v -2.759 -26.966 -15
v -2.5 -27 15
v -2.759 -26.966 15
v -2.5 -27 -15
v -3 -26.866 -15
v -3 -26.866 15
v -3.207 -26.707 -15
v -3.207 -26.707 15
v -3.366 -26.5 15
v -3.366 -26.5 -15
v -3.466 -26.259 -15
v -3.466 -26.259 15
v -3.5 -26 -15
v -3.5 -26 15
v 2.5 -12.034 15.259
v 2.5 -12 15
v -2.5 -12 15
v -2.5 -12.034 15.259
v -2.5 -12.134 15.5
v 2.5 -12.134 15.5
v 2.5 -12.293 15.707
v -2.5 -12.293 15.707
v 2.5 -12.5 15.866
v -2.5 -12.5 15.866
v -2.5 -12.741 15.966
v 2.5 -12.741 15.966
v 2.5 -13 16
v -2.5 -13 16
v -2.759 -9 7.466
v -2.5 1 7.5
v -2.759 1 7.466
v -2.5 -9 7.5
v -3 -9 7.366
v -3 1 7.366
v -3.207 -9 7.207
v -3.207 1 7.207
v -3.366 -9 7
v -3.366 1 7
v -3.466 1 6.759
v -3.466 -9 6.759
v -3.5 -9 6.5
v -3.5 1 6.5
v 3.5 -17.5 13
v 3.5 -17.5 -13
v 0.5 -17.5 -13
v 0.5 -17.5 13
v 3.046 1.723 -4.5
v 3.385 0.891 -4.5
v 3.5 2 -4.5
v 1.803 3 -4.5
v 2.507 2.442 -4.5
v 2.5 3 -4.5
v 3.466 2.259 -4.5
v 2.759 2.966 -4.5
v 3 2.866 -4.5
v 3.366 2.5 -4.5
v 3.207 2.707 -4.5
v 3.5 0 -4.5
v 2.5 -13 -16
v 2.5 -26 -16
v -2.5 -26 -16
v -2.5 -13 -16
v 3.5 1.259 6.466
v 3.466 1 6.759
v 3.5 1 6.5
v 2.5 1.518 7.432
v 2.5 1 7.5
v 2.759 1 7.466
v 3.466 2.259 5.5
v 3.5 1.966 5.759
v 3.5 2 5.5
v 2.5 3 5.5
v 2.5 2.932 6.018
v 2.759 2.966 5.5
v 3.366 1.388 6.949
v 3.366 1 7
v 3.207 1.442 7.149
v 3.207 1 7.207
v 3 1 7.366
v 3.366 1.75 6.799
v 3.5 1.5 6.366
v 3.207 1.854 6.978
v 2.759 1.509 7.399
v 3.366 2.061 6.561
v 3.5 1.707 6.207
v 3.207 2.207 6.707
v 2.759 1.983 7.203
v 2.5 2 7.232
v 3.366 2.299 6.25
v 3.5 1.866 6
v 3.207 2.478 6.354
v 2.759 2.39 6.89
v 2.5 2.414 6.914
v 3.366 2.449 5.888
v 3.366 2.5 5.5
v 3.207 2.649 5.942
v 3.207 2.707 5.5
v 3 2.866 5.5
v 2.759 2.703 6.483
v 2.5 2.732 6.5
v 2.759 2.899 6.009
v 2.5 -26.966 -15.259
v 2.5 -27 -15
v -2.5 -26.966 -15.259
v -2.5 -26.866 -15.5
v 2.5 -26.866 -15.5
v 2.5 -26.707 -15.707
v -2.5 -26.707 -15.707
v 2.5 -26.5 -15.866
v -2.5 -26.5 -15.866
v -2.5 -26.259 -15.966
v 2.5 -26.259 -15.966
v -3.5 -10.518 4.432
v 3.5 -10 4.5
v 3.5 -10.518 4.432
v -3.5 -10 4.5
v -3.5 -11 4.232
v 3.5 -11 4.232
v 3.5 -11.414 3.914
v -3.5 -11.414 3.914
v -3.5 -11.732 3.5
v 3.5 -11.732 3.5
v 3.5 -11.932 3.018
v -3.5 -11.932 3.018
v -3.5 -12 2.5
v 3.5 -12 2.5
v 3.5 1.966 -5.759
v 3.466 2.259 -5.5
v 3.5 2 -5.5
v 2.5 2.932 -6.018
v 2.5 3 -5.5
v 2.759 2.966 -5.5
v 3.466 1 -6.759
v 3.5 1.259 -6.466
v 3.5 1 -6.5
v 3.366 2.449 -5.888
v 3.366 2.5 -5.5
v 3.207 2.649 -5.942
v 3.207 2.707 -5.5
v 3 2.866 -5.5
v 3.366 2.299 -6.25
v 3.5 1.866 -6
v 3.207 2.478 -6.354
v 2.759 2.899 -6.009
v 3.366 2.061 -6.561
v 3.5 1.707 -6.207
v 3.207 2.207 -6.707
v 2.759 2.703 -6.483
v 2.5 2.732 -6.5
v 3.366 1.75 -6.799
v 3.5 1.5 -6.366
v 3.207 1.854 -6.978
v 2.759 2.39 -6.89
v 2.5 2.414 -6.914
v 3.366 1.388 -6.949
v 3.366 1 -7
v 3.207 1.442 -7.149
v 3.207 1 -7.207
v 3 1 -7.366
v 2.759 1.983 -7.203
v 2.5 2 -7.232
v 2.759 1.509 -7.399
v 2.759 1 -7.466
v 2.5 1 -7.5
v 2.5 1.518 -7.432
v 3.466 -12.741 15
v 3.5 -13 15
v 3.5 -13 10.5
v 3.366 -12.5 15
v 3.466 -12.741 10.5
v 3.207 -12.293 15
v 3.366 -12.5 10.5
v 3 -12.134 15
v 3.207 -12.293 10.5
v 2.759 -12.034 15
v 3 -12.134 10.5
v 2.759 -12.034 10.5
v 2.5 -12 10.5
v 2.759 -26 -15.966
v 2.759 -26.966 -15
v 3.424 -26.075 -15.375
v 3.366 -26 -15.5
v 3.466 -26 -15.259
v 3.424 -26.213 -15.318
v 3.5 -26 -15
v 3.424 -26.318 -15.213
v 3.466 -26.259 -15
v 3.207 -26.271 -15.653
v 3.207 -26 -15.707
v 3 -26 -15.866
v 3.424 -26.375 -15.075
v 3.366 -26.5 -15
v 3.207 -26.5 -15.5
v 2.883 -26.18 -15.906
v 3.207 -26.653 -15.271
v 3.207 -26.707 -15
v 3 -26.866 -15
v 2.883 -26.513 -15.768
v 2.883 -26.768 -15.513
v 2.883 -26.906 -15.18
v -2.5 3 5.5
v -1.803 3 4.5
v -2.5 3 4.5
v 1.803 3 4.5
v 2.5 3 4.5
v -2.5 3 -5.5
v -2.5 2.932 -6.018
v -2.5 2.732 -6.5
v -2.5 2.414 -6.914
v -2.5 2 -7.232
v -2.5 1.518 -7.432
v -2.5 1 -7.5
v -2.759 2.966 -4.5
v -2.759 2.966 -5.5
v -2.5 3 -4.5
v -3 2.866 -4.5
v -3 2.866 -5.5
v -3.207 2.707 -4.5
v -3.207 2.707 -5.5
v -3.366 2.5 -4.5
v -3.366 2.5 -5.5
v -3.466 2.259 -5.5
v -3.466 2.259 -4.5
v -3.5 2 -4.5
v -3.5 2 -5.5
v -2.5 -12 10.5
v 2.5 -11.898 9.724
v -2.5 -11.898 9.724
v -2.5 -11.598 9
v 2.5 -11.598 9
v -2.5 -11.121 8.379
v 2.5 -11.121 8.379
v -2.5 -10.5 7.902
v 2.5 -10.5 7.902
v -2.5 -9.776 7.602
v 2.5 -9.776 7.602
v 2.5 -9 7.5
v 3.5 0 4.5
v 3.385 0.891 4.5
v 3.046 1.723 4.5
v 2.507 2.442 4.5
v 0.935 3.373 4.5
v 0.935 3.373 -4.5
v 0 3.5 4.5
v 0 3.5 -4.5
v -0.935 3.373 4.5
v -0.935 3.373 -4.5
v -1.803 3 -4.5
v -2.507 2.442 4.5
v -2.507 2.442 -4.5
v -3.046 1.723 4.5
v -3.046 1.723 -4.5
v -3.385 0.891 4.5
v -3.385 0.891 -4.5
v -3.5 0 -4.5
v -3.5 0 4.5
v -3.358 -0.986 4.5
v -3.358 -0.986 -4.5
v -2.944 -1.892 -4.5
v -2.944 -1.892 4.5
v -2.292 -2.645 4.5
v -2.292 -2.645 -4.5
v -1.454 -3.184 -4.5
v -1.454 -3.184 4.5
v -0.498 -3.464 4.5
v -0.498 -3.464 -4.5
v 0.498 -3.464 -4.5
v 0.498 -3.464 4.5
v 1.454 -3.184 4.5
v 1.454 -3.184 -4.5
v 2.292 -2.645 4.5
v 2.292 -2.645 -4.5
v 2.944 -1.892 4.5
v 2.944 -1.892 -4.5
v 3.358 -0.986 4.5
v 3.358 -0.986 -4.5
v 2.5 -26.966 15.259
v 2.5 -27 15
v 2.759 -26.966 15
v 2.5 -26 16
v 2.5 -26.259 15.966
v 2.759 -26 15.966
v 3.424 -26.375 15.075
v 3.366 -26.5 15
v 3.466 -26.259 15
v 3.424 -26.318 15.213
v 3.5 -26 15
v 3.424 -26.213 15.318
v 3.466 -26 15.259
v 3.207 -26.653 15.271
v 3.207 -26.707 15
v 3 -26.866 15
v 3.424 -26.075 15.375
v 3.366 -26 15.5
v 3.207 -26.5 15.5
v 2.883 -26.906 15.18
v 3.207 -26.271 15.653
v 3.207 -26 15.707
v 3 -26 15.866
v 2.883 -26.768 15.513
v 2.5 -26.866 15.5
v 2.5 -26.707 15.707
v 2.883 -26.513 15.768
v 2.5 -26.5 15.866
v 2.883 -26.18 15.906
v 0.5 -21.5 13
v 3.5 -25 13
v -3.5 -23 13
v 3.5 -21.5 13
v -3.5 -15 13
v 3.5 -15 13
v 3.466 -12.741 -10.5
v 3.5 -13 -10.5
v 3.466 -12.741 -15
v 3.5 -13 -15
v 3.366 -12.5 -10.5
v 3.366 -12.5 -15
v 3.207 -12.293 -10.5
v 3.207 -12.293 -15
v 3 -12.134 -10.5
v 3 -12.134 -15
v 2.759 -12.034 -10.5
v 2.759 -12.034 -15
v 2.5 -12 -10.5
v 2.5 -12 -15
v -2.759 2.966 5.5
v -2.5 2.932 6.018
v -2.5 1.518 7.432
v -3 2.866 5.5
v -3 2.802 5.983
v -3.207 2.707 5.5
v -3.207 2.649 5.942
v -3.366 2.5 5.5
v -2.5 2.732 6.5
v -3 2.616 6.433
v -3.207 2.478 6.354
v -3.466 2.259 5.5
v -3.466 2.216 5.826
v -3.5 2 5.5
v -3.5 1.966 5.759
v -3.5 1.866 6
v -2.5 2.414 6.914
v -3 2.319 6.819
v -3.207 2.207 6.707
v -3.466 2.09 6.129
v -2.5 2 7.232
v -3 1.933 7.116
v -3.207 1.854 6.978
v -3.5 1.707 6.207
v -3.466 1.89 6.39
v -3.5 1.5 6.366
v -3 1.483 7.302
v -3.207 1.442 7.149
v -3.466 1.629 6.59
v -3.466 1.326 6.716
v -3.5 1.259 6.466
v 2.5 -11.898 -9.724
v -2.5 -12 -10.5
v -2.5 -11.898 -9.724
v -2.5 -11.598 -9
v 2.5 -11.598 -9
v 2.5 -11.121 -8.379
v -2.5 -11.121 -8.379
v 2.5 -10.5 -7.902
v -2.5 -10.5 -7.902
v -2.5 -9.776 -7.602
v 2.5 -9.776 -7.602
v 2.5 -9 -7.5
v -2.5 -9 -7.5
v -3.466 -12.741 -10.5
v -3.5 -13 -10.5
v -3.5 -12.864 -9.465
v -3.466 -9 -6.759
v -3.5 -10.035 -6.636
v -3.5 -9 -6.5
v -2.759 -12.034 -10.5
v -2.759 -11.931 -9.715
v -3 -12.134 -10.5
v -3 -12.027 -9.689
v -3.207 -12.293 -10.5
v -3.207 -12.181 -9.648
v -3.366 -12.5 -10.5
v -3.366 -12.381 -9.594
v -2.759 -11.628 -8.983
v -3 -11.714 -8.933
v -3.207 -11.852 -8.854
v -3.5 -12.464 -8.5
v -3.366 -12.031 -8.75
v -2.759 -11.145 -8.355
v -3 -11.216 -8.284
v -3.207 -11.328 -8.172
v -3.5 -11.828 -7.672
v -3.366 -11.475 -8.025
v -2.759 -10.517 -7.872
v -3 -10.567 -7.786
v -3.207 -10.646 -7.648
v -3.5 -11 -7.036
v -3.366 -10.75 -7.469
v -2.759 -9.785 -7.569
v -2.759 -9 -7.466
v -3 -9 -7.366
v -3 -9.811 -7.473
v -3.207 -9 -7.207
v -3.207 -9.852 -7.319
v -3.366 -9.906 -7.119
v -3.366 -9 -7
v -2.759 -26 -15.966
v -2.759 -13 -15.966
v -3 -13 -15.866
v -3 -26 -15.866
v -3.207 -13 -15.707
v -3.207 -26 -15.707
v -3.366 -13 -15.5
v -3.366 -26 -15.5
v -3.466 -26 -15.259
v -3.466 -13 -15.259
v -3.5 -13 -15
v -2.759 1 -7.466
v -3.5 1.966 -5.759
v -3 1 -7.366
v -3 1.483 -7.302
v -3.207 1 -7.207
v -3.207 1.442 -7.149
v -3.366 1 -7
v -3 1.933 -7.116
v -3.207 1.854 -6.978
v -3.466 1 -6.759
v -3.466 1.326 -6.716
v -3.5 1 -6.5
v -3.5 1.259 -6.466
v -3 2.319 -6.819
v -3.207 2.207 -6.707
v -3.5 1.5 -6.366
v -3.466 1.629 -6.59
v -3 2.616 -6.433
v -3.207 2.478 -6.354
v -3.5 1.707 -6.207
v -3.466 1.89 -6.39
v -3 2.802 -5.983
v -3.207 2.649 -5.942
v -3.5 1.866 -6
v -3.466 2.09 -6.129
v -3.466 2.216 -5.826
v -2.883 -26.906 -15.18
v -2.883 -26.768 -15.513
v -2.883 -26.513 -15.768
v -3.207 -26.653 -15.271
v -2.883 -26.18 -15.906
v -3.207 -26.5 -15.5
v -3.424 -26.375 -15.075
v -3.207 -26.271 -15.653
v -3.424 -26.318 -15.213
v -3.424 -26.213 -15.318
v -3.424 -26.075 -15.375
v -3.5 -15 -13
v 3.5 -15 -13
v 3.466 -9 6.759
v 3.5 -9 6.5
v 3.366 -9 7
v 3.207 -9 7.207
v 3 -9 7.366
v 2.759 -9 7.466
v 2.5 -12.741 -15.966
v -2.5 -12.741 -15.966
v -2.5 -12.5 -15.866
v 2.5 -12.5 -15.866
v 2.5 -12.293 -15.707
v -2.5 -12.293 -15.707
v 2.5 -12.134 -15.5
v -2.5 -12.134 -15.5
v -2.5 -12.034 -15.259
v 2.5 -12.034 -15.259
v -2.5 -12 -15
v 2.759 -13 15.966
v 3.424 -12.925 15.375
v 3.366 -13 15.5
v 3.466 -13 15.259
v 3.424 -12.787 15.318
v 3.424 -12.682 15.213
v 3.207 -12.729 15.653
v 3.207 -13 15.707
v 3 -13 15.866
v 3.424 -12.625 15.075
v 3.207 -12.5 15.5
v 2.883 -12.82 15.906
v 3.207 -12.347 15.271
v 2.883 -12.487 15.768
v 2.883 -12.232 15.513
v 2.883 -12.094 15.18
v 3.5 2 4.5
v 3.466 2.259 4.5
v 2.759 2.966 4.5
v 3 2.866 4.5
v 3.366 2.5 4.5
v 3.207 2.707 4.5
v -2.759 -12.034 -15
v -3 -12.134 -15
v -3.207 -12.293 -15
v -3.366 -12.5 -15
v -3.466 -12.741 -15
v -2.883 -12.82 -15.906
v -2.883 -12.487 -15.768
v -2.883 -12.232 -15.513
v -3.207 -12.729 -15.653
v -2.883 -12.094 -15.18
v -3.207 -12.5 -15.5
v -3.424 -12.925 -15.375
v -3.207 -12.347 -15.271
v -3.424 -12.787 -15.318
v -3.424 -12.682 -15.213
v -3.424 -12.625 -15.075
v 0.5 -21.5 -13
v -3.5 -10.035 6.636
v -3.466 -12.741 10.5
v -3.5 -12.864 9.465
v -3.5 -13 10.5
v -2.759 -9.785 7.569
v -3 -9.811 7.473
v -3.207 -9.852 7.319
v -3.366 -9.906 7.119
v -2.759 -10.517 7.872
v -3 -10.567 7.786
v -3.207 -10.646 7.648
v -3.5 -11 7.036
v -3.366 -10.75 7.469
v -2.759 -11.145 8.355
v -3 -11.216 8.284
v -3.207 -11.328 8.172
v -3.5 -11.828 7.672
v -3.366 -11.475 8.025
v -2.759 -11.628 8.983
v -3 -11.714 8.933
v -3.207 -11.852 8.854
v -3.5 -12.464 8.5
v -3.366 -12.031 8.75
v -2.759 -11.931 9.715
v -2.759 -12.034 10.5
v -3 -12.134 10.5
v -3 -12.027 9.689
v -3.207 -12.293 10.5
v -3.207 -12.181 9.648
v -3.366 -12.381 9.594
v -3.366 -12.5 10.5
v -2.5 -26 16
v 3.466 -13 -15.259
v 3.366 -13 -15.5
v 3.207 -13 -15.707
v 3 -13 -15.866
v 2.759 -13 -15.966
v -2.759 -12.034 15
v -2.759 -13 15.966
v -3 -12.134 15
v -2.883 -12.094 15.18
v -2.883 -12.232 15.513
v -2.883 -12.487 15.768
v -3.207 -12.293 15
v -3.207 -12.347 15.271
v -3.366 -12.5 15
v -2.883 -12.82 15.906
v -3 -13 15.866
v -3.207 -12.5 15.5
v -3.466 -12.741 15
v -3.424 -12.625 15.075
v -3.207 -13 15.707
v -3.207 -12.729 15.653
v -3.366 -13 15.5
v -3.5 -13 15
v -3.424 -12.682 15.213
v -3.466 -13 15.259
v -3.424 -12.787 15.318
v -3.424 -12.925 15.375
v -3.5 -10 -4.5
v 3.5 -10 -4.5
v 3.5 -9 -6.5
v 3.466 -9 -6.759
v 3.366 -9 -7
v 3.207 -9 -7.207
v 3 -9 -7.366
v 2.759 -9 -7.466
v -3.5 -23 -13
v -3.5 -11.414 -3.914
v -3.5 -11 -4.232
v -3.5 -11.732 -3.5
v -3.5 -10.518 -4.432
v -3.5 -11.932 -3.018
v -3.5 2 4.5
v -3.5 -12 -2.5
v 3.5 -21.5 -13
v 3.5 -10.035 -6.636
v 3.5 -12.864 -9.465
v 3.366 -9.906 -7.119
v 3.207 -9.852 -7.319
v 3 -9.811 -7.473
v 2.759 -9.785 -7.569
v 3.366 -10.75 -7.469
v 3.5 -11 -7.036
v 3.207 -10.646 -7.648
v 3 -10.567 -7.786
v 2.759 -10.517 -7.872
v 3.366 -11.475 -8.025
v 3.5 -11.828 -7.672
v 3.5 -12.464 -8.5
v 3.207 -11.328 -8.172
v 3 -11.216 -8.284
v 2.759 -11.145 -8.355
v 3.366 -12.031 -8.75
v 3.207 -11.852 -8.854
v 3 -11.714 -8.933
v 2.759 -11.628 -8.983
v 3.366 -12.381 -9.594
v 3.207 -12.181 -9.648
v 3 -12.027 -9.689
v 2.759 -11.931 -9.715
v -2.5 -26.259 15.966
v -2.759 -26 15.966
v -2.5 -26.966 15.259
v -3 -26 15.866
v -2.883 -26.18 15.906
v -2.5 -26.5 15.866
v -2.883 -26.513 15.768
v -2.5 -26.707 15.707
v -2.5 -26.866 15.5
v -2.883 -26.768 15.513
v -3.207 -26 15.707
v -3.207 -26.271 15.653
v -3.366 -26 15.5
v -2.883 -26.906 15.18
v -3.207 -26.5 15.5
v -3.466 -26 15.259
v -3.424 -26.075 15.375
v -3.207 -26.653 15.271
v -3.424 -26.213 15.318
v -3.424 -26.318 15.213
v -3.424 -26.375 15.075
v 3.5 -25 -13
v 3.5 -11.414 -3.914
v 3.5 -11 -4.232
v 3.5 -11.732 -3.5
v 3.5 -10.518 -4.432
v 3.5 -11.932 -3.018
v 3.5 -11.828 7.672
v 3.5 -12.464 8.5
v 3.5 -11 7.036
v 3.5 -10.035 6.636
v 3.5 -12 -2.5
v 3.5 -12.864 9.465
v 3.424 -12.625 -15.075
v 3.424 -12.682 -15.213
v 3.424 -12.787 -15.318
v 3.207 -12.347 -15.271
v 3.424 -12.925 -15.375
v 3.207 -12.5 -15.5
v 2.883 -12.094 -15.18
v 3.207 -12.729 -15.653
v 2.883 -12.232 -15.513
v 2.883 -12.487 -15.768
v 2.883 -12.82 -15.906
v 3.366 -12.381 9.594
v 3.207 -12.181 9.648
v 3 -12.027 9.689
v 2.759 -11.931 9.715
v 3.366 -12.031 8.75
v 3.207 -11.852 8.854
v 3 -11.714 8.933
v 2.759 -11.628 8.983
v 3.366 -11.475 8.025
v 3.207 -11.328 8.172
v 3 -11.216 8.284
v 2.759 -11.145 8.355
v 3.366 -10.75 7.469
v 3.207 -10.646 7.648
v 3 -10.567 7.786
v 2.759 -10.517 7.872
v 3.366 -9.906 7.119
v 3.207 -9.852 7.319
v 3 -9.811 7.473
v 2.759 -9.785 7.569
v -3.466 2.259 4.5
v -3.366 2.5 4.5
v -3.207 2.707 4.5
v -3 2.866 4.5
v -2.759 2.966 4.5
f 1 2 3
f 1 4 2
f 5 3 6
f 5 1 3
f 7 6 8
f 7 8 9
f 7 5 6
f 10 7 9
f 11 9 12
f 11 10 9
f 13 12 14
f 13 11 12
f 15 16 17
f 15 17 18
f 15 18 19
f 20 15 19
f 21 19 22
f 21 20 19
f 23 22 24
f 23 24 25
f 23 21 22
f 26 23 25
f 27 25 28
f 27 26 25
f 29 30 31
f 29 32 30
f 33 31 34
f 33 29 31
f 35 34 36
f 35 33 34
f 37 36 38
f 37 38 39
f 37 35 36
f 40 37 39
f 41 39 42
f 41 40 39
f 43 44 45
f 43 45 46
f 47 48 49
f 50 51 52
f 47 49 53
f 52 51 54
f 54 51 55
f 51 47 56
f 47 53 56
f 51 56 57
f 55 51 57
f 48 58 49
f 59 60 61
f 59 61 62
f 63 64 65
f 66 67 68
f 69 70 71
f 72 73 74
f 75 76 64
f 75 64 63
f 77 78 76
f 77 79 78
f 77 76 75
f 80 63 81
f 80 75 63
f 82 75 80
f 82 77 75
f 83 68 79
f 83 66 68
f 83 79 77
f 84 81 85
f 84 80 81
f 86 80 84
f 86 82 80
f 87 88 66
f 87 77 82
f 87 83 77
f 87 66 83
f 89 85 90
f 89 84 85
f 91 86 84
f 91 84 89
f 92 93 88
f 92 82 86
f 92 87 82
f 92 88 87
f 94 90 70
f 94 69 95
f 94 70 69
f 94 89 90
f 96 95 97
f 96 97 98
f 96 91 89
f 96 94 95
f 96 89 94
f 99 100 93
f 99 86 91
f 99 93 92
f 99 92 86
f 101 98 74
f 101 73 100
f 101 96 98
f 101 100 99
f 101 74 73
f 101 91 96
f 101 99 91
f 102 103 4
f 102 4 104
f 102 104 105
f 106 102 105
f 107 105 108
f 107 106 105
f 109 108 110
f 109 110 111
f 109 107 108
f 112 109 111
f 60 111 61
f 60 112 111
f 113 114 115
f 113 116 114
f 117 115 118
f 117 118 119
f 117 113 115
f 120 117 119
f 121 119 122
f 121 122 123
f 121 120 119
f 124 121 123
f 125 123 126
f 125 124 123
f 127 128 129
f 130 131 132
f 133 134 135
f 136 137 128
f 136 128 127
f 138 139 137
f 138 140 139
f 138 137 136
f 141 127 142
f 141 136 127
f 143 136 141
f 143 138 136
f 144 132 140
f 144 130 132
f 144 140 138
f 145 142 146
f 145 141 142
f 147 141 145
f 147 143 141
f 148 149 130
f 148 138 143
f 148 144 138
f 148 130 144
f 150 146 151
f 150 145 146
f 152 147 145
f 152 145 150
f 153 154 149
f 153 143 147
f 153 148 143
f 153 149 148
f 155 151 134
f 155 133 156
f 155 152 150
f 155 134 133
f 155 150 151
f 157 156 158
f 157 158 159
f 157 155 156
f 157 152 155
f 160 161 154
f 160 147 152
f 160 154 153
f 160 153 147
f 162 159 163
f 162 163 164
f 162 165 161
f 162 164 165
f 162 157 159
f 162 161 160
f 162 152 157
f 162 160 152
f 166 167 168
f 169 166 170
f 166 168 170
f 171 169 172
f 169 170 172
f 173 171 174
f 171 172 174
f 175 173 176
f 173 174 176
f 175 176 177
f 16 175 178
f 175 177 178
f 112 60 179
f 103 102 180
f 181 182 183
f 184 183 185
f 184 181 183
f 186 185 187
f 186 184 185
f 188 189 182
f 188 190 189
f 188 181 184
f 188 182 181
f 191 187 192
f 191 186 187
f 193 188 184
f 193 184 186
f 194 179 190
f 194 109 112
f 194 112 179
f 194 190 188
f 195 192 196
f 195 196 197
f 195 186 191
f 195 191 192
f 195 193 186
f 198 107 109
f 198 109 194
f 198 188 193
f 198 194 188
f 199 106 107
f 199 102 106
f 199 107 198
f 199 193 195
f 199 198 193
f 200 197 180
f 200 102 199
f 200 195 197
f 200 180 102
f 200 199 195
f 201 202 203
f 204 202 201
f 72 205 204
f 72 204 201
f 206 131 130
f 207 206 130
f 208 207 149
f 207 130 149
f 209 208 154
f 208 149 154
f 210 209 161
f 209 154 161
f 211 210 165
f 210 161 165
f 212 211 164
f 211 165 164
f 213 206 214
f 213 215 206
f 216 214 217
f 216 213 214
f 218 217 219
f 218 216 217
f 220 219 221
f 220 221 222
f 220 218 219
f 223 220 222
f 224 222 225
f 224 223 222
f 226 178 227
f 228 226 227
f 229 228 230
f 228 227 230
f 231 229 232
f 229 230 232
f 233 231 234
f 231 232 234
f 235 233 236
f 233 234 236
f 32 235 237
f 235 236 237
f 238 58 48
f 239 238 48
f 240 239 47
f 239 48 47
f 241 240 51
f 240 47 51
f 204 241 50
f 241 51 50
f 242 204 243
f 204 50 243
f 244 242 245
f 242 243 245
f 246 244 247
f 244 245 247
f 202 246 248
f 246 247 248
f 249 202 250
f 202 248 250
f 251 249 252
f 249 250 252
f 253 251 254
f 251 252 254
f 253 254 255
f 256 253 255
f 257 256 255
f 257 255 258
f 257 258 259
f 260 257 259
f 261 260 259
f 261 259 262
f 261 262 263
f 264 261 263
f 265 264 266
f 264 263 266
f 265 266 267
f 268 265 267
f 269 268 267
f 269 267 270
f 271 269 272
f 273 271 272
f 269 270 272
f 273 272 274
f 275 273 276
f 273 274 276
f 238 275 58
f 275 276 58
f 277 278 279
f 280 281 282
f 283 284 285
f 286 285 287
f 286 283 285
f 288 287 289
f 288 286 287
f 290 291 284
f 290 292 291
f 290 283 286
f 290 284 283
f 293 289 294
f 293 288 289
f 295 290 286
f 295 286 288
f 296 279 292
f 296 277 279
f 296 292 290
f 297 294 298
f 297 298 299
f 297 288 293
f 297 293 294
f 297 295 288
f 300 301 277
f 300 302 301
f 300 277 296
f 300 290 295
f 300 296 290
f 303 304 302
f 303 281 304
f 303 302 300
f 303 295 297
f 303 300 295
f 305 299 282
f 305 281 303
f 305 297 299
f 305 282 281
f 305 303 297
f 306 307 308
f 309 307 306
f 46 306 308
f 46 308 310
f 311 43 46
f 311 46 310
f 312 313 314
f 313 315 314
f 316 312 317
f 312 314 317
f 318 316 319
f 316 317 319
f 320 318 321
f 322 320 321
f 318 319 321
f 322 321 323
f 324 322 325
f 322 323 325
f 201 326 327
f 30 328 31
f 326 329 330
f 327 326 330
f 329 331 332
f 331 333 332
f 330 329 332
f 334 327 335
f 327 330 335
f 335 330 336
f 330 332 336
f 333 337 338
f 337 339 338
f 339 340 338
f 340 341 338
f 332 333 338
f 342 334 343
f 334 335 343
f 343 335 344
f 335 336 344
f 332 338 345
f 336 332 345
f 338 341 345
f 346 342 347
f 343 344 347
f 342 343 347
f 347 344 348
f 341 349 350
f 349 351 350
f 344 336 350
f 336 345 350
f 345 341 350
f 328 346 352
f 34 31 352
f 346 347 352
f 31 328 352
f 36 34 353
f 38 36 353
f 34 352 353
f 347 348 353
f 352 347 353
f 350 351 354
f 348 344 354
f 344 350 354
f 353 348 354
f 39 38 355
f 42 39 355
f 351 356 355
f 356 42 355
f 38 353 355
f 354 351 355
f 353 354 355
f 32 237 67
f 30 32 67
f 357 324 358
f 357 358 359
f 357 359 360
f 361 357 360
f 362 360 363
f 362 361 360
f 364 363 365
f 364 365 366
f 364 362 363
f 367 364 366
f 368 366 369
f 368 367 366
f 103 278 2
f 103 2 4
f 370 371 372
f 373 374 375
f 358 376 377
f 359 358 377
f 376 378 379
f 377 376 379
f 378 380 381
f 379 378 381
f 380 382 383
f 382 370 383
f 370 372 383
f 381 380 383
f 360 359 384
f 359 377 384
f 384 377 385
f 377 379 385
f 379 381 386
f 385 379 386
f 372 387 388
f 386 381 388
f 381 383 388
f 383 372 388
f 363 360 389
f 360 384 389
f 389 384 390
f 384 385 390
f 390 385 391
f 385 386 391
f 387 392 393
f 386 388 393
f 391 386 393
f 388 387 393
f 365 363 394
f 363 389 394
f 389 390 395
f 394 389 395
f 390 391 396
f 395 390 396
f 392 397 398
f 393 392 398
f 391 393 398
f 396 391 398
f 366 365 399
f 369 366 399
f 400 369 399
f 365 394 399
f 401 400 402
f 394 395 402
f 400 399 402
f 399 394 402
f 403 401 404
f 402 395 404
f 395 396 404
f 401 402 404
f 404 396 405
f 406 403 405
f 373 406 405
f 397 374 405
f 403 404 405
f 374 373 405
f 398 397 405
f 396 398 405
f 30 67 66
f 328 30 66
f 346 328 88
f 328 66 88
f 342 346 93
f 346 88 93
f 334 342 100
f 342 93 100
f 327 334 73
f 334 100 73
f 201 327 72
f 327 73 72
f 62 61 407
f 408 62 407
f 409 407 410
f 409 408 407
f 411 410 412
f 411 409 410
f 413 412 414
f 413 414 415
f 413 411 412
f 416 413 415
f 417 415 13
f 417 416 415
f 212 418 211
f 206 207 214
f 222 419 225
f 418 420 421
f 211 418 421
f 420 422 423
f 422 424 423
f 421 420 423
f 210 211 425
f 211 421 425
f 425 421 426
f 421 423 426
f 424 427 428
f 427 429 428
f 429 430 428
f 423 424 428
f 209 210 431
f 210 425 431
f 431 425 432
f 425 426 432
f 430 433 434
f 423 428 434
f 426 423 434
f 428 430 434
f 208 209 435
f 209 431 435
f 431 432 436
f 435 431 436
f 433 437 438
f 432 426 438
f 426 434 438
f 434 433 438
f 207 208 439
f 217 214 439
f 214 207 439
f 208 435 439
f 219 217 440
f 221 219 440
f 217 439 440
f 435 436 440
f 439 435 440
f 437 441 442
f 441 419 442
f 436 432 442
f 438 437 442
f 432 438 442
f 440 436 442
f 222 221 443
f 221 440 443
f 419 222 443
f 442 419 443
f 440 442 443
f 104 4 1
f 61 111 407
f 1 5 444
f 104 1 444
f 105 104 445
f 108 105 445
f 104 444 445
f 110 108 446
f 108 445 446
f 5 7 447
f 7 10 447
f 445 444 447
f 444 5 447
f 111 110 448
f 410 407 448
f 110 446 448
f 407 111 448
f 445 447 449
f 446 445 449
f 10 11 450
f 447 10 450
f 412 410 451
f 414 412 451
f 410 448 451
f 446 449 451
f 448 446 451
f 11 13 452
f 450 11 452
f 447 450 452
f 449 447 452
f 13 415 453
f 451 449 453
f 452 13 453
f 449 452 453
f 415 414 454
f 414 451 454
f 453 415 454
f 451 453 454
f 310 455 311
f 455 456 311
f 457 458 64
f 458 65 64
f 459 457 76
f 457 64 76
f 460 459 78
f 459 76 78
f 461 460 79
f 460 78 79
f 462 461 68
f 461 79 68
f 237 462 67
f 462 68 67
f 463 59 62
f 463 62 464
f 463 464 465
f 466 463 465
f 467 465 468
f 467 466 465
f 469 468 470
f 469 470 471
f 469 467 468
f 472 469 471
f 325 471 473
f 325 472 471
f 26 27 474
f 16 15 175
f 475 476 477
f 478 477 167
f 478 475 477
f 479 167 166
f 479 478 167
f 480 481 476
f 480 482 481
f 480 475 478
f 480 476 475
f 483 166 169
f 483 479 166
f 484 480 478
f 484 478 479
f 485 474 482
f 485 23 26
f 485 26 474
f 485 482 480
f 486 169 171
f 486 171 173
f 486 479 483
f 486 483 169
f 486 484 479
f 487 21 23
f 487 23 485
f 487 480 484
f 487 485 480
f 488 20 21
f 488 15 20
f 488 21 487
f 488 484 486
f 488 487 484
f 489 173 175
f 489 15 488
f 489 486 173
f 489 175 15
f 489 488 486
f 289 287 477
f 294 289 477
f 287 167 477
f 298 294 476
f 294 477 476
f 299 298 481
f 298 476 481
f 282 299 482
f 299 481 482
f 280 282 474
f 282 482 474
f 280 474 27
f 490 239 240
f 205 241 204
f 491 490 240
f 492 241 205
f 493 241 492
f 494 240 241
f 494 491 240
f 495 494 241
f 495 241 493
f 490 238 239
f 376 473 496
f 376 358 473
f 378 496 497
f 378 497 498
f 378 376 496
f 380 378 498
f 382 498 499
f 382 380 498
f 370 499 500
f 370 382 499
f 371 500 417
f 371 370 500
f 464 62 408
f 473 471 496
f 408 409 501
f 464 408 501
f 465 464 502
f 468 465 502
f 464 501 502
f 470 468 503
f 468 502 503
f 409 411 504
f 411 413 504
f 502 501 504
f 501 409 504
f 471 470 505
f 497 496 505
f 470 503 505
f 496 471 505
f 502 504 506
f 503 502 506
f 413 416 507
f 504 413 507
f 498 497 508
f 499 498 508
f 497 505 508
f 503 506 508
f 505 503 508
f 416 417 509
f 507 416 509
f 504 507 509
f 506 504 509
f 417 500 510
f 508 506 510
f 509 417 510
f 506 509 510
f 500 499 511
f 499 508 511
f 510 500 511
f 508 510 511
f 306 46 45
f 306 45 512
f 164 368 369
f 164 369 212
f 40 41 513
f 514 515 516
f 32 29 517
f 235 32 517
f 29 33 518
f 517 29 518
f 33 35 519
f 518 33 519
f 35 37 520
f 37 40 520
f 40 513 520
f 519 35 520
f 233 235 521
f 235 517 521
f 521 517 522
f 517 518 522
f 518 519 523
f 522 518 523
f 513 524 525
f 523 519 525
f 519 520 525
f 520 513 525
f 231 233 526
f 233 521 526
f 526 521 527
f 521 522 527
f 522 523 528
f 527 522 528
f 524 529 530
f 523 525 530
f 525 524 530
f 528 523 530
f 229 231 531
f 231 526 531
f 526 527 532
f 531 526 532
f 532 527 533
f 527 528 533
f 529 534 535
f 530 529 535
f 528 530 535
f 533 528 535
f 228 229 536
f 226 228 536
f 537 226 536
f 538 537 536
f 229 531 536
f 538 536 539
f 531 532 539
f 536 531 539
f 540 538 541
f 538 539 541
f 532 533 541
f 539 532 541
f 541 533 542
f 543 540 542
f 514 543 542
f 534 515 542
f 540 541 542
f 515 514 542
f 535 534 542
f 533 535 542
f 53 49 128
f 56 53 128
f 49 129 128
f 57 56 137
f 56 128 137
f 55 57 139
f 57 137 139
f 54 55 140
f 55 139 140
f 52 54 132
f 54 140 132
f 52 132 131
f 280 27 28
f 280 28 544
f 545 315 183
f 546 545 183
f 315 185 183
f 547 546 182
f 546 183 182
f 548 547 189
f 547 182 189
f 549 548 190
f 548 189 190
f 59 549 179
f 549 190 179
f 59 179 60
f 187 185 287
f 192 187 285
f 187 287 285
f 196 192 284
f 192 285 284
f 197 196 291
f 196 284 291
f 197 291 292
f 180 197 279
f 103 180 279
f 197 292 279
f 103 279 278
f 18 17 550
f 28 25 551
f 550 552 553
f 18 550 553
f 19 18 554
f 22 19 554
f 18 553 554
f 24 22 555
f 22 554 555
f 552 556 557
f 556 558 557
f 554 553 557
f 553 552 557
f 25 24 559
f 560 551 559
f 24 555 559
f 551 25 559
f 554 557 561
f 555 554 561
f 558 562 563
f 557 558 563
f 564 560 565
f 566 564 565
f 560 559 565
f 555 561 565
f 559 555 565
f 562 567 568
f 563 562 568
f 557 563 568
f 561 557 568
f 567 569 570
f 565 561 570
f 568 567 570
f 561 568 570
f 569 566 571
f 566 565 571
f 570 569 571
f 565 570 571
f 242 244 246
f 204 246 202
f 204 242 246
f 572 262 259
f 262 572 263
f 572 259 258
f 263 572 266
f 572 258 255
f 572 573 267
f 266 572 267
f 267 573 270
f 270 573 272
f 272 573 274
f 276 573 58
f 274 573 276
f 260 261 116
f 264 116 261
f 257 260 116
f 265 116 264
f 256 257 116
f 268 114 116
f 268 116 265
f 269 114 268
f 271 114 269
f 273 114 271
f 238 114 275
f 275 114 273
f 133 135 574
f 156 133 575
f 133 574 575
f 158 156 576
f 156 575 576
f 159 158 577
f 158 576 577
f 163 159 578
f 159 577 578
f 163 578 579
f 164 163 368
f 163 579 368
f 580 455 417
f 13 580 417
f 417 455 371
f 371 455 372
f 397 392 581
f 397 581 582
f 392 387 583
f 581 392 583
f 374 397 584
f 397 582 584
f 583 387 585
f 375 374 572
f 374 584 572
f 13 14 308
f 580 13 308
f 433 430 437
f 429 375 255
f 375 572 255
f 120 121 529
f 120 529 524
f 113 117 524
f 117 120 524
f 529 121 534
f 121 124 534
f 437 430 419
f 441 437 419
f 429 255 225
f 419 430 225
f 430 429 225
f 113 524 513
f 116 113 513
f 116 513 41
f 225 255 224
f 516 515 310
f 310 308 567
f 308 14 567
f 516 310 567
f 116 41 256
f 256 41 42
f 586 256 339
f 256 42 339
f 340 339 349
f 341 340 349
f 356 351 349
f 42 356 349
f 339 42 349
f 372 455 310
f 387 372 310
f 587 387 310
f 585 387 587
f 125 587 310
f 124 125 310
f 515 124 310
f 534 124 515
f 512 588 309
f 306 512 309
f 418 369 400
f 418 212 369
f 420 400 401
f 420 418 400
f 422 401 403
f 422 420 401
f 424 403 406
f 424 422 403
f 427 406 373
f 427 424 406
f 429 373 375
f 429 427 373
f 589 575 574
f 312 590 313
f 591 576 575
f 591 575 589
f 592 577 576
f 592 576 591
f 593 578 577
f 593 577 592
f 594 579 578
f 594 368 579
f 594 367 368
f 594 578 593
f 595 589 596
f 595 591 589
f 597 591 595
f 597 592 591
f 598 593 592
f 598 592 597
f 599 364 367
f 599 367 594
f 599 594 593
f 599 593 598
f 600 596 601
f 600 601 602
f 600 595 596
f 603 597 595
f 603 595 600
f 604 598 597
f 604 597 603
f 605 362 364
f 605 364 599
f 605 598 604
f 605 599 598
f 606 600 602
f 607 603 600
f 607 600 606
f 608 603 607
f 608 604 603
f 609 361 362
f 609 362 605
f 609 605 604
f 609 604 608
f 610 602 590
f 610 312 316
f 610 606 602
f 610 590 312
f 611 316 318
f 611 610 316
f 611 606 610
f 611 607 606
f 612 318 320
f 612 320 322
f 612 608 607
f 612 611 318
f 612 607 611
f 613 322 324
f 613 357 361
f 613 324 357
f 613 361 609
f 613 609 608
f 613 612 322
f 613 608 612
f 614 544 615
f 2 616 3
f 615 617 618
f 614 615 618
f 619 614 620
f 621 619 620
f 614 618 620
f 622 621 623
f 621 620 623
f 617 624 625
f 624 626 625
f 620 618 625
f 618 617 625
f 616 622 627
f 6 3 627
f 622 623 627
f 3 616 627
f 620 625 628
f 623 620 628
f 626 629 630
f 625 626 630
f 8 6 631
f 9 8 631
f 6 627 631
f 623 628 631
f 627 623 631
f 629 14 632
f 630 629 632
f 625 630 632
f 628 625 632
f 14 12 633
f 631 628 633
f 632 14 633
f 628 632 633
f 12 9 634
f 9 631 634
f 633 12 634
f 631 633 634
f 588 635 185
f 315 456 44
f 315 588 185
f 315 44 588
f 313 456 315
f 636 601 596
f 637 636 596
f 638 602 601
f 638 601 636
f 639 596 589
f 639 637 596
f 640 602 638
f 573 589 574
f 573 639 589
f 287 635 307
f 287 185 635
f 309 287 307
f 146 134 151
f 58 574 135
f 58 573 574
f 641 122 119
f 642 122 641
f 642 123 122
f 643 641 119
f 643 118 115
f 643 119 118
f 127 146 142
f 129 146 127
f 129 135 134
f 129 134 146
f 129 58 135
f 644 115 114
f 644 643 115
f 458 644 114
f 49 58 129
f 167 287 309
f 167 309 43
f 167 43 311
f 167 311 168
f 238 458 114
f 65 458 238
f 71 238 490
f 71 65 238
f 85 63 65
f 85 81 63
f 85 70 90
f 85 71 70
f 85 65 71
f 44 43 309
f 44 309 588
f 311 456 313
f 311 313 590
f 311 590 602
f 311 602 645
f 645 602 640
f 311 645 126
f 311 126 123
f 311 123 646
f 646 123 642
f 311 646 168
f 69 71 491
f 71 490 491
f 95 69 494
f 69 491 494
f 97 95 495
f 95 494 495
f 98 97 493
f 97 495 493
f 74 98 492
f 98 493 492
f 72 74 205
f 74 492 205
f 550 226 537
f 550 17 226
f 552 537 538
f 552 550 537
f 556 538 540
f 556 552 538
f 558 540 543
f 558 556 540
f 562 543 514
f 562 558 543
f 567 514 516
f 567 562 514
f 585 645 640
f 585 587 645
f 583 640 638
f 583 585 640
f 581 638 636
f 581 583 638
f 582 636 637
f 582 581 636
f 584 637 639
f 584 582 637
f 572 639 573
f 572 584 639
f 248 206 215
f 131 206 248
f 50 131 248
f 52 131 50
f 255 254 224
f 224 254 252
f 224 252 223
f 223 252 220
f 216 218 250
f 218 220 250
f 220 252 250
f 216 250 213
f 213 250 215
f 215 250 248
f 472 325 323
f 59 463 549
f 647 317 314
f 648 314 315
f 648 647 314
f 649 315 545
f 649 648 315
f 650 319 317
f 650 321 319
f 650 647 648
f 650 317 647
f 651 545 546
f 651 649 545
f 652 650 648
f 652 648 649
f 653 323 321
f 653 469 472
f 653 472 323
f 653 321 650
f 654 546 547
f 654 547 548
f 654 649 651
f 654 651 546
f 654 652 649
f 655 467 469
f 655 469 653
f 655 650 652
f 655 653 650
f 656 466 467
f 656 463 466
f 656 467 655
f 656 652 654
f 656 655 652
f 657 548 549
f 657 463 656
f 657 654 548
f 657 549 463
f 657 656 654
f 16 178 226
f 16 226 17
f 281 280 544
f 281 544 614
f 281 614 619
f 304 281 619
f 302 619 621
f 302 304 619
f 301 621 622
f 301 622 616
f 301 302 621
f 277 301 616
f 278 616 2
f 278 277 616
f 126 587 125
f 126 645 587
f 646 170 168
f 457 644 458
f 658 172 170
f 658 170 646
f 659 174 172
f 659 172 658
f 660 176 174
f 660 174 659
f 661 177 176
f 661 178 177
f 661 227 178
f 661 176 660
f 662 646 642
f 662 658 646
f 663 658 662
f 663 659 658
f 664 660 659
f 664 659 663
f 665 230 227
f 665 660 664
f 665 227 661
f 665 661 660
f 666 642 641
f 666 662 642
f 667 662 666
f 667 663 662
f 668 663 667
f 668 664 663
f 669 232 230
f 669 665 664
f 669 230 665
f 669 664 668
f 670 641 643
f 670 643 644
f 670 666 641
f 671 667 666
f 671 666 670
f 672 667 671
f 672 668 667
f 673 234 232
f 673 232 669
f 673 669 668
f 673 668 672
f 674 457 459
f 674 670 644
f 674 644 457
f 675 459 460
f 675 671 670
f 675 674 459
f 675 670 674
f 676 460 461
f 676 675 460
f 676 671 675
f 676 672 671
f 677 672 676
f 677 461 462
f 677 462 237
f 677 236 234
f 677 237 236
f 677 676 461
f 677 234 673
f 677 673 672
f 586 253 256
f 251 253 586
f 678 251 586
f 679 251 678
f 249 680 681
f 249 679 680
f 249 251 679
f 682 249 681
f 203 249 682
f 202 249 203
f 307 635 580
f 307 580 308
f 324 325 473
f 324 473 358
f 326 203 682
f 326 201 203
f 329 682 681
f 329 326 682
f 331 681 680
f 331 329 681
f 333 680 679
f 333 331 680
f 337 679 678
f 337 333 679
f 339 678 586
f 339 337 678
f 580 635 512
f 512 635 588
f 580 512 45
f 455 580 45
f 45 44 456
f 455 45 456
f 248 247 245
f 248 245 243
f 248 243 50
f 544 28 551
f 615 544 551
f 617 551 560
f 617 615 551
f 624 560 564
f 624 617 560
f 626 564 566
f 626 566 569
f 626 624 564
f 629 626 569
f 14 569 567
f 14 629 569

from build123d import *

# Parameters (mm, degrees)
F0_W      = 15
F0_H      = 3
F0_W_2    = 1.5
F0_H_2    = 26
F0_W_3    = 2.5
F1_DEPTH  = 3.5
F2_R      = 3.5
F3_DEPTH  = 9
F4_R      = 1
F5_R      = 3
F6_R      = 2
F7_R      = 1
F8_SIZE2  = 1.99999
F8_SIZE   = 6.99999
F9_W      = 4
F9_H      = 26
F10_DEPTH = 4


# Not quite as in the source:
# - a fillet or chamfer is up to 0.001 mm smaller than in the source, because OpenCascade refuses the exact size


with BuildPart() as f1:
    # F0 (on Right) → F1 (new body, symmetric)
    with BuildSketch(Plane.YZ):
        with Locations((-4.5, 6)):
            Rectangle(F0_W, F0_H)
        Polygon((-12, -4.5), (-12, 4.5), (-12, 7.5), (-12, 16), (-27, 16), (-27, -16), (-12, -16), (-12, -7.5), align=None)
        with Locations((-22.25, 0)):
            Rectangle(F0_W_2, F0_H_2, mode=Mode.SUBTRACT)
        with Locations((-16.25, 0)):
            Rectangle(F0_W_3, F0_H_2, mode=Mode.SUBTRACT)
        with Locations((-4.5, -6)):
            Rectangle(F0_W, F0_H)
    extrude(amount=F1_DEPTH, both=True)

    # F2 (on face) → F3 (join, through all)
    with BuildSketch(Plane.XY.offset(-4.5)):
        Circle(F2_R)
    extrude(amount=F3_DEPTH)

    # F4
    f4_edges = [f1.edges().sort_by_distance(p)[0] for p in [
        (0, -27, 16),
        (0, -12, 16),
        (0, -27, -16),
        (0, -12, -16),
    ]]
    fillet(f4_edges, radius=F4_R)

    # F5
    f5_edges = [f1.edges().sort_by_distance(p)[0] for p in [
        (0, -12, 7.5),
        (0, -12, -7.5),
    ]]
    fillet(f5_edges, radius=F5_R)

    # F6
    f6_edges = [f1.edges().sort_by_distance(p)[0] for p in [
        (0, 3, 7.5),
        (0, 3, -7.5),
        (0, -12, -4.5),
        (0, -12, 4.5),
    ]]
    fillet(f6_edges, radius=F6_R)

    # F7
    f7_edges = [f1.edges().sort_by_distance(p)[0] for p in [
        (-3.5, -4, -7.5),
        (-3.5, -4, 7.5),
        (3.5, 2.414214, 6.914214),
        (3.5, 2.414214, -6.914214),
    ]]
    fillet(f7_edges, radius=F7_R)

    # F8 (size 7 and 2 in the source; OpenCascade refuses exactly that, so slightly less here)
    f8_edges = [f1.edges().sort_by_distance(p)[0] for p in [
        (3.5, -23, 0),
    ]]
    f8_side = f1.faces().sort_by_distance((0, -23, 0))[0]
    chamfer(f8_edges, length=F8_SIZE, length2=F8_SIZE2, reference=f8_side)

    # F9 (on face) → F10 (cut)
    with BuildSketch(Plane(origin=(-3.5, 0, 0), x_dir=(0, -1, 0), z_dir=(-1, 0, 0))):
        with Locations((19.5, 0)):
            Rectangle(F9_W, F9_H)
    extrude(amount=-F10_DEPTH, mode=Mode.SUBTRACT)


solid = f1.part
